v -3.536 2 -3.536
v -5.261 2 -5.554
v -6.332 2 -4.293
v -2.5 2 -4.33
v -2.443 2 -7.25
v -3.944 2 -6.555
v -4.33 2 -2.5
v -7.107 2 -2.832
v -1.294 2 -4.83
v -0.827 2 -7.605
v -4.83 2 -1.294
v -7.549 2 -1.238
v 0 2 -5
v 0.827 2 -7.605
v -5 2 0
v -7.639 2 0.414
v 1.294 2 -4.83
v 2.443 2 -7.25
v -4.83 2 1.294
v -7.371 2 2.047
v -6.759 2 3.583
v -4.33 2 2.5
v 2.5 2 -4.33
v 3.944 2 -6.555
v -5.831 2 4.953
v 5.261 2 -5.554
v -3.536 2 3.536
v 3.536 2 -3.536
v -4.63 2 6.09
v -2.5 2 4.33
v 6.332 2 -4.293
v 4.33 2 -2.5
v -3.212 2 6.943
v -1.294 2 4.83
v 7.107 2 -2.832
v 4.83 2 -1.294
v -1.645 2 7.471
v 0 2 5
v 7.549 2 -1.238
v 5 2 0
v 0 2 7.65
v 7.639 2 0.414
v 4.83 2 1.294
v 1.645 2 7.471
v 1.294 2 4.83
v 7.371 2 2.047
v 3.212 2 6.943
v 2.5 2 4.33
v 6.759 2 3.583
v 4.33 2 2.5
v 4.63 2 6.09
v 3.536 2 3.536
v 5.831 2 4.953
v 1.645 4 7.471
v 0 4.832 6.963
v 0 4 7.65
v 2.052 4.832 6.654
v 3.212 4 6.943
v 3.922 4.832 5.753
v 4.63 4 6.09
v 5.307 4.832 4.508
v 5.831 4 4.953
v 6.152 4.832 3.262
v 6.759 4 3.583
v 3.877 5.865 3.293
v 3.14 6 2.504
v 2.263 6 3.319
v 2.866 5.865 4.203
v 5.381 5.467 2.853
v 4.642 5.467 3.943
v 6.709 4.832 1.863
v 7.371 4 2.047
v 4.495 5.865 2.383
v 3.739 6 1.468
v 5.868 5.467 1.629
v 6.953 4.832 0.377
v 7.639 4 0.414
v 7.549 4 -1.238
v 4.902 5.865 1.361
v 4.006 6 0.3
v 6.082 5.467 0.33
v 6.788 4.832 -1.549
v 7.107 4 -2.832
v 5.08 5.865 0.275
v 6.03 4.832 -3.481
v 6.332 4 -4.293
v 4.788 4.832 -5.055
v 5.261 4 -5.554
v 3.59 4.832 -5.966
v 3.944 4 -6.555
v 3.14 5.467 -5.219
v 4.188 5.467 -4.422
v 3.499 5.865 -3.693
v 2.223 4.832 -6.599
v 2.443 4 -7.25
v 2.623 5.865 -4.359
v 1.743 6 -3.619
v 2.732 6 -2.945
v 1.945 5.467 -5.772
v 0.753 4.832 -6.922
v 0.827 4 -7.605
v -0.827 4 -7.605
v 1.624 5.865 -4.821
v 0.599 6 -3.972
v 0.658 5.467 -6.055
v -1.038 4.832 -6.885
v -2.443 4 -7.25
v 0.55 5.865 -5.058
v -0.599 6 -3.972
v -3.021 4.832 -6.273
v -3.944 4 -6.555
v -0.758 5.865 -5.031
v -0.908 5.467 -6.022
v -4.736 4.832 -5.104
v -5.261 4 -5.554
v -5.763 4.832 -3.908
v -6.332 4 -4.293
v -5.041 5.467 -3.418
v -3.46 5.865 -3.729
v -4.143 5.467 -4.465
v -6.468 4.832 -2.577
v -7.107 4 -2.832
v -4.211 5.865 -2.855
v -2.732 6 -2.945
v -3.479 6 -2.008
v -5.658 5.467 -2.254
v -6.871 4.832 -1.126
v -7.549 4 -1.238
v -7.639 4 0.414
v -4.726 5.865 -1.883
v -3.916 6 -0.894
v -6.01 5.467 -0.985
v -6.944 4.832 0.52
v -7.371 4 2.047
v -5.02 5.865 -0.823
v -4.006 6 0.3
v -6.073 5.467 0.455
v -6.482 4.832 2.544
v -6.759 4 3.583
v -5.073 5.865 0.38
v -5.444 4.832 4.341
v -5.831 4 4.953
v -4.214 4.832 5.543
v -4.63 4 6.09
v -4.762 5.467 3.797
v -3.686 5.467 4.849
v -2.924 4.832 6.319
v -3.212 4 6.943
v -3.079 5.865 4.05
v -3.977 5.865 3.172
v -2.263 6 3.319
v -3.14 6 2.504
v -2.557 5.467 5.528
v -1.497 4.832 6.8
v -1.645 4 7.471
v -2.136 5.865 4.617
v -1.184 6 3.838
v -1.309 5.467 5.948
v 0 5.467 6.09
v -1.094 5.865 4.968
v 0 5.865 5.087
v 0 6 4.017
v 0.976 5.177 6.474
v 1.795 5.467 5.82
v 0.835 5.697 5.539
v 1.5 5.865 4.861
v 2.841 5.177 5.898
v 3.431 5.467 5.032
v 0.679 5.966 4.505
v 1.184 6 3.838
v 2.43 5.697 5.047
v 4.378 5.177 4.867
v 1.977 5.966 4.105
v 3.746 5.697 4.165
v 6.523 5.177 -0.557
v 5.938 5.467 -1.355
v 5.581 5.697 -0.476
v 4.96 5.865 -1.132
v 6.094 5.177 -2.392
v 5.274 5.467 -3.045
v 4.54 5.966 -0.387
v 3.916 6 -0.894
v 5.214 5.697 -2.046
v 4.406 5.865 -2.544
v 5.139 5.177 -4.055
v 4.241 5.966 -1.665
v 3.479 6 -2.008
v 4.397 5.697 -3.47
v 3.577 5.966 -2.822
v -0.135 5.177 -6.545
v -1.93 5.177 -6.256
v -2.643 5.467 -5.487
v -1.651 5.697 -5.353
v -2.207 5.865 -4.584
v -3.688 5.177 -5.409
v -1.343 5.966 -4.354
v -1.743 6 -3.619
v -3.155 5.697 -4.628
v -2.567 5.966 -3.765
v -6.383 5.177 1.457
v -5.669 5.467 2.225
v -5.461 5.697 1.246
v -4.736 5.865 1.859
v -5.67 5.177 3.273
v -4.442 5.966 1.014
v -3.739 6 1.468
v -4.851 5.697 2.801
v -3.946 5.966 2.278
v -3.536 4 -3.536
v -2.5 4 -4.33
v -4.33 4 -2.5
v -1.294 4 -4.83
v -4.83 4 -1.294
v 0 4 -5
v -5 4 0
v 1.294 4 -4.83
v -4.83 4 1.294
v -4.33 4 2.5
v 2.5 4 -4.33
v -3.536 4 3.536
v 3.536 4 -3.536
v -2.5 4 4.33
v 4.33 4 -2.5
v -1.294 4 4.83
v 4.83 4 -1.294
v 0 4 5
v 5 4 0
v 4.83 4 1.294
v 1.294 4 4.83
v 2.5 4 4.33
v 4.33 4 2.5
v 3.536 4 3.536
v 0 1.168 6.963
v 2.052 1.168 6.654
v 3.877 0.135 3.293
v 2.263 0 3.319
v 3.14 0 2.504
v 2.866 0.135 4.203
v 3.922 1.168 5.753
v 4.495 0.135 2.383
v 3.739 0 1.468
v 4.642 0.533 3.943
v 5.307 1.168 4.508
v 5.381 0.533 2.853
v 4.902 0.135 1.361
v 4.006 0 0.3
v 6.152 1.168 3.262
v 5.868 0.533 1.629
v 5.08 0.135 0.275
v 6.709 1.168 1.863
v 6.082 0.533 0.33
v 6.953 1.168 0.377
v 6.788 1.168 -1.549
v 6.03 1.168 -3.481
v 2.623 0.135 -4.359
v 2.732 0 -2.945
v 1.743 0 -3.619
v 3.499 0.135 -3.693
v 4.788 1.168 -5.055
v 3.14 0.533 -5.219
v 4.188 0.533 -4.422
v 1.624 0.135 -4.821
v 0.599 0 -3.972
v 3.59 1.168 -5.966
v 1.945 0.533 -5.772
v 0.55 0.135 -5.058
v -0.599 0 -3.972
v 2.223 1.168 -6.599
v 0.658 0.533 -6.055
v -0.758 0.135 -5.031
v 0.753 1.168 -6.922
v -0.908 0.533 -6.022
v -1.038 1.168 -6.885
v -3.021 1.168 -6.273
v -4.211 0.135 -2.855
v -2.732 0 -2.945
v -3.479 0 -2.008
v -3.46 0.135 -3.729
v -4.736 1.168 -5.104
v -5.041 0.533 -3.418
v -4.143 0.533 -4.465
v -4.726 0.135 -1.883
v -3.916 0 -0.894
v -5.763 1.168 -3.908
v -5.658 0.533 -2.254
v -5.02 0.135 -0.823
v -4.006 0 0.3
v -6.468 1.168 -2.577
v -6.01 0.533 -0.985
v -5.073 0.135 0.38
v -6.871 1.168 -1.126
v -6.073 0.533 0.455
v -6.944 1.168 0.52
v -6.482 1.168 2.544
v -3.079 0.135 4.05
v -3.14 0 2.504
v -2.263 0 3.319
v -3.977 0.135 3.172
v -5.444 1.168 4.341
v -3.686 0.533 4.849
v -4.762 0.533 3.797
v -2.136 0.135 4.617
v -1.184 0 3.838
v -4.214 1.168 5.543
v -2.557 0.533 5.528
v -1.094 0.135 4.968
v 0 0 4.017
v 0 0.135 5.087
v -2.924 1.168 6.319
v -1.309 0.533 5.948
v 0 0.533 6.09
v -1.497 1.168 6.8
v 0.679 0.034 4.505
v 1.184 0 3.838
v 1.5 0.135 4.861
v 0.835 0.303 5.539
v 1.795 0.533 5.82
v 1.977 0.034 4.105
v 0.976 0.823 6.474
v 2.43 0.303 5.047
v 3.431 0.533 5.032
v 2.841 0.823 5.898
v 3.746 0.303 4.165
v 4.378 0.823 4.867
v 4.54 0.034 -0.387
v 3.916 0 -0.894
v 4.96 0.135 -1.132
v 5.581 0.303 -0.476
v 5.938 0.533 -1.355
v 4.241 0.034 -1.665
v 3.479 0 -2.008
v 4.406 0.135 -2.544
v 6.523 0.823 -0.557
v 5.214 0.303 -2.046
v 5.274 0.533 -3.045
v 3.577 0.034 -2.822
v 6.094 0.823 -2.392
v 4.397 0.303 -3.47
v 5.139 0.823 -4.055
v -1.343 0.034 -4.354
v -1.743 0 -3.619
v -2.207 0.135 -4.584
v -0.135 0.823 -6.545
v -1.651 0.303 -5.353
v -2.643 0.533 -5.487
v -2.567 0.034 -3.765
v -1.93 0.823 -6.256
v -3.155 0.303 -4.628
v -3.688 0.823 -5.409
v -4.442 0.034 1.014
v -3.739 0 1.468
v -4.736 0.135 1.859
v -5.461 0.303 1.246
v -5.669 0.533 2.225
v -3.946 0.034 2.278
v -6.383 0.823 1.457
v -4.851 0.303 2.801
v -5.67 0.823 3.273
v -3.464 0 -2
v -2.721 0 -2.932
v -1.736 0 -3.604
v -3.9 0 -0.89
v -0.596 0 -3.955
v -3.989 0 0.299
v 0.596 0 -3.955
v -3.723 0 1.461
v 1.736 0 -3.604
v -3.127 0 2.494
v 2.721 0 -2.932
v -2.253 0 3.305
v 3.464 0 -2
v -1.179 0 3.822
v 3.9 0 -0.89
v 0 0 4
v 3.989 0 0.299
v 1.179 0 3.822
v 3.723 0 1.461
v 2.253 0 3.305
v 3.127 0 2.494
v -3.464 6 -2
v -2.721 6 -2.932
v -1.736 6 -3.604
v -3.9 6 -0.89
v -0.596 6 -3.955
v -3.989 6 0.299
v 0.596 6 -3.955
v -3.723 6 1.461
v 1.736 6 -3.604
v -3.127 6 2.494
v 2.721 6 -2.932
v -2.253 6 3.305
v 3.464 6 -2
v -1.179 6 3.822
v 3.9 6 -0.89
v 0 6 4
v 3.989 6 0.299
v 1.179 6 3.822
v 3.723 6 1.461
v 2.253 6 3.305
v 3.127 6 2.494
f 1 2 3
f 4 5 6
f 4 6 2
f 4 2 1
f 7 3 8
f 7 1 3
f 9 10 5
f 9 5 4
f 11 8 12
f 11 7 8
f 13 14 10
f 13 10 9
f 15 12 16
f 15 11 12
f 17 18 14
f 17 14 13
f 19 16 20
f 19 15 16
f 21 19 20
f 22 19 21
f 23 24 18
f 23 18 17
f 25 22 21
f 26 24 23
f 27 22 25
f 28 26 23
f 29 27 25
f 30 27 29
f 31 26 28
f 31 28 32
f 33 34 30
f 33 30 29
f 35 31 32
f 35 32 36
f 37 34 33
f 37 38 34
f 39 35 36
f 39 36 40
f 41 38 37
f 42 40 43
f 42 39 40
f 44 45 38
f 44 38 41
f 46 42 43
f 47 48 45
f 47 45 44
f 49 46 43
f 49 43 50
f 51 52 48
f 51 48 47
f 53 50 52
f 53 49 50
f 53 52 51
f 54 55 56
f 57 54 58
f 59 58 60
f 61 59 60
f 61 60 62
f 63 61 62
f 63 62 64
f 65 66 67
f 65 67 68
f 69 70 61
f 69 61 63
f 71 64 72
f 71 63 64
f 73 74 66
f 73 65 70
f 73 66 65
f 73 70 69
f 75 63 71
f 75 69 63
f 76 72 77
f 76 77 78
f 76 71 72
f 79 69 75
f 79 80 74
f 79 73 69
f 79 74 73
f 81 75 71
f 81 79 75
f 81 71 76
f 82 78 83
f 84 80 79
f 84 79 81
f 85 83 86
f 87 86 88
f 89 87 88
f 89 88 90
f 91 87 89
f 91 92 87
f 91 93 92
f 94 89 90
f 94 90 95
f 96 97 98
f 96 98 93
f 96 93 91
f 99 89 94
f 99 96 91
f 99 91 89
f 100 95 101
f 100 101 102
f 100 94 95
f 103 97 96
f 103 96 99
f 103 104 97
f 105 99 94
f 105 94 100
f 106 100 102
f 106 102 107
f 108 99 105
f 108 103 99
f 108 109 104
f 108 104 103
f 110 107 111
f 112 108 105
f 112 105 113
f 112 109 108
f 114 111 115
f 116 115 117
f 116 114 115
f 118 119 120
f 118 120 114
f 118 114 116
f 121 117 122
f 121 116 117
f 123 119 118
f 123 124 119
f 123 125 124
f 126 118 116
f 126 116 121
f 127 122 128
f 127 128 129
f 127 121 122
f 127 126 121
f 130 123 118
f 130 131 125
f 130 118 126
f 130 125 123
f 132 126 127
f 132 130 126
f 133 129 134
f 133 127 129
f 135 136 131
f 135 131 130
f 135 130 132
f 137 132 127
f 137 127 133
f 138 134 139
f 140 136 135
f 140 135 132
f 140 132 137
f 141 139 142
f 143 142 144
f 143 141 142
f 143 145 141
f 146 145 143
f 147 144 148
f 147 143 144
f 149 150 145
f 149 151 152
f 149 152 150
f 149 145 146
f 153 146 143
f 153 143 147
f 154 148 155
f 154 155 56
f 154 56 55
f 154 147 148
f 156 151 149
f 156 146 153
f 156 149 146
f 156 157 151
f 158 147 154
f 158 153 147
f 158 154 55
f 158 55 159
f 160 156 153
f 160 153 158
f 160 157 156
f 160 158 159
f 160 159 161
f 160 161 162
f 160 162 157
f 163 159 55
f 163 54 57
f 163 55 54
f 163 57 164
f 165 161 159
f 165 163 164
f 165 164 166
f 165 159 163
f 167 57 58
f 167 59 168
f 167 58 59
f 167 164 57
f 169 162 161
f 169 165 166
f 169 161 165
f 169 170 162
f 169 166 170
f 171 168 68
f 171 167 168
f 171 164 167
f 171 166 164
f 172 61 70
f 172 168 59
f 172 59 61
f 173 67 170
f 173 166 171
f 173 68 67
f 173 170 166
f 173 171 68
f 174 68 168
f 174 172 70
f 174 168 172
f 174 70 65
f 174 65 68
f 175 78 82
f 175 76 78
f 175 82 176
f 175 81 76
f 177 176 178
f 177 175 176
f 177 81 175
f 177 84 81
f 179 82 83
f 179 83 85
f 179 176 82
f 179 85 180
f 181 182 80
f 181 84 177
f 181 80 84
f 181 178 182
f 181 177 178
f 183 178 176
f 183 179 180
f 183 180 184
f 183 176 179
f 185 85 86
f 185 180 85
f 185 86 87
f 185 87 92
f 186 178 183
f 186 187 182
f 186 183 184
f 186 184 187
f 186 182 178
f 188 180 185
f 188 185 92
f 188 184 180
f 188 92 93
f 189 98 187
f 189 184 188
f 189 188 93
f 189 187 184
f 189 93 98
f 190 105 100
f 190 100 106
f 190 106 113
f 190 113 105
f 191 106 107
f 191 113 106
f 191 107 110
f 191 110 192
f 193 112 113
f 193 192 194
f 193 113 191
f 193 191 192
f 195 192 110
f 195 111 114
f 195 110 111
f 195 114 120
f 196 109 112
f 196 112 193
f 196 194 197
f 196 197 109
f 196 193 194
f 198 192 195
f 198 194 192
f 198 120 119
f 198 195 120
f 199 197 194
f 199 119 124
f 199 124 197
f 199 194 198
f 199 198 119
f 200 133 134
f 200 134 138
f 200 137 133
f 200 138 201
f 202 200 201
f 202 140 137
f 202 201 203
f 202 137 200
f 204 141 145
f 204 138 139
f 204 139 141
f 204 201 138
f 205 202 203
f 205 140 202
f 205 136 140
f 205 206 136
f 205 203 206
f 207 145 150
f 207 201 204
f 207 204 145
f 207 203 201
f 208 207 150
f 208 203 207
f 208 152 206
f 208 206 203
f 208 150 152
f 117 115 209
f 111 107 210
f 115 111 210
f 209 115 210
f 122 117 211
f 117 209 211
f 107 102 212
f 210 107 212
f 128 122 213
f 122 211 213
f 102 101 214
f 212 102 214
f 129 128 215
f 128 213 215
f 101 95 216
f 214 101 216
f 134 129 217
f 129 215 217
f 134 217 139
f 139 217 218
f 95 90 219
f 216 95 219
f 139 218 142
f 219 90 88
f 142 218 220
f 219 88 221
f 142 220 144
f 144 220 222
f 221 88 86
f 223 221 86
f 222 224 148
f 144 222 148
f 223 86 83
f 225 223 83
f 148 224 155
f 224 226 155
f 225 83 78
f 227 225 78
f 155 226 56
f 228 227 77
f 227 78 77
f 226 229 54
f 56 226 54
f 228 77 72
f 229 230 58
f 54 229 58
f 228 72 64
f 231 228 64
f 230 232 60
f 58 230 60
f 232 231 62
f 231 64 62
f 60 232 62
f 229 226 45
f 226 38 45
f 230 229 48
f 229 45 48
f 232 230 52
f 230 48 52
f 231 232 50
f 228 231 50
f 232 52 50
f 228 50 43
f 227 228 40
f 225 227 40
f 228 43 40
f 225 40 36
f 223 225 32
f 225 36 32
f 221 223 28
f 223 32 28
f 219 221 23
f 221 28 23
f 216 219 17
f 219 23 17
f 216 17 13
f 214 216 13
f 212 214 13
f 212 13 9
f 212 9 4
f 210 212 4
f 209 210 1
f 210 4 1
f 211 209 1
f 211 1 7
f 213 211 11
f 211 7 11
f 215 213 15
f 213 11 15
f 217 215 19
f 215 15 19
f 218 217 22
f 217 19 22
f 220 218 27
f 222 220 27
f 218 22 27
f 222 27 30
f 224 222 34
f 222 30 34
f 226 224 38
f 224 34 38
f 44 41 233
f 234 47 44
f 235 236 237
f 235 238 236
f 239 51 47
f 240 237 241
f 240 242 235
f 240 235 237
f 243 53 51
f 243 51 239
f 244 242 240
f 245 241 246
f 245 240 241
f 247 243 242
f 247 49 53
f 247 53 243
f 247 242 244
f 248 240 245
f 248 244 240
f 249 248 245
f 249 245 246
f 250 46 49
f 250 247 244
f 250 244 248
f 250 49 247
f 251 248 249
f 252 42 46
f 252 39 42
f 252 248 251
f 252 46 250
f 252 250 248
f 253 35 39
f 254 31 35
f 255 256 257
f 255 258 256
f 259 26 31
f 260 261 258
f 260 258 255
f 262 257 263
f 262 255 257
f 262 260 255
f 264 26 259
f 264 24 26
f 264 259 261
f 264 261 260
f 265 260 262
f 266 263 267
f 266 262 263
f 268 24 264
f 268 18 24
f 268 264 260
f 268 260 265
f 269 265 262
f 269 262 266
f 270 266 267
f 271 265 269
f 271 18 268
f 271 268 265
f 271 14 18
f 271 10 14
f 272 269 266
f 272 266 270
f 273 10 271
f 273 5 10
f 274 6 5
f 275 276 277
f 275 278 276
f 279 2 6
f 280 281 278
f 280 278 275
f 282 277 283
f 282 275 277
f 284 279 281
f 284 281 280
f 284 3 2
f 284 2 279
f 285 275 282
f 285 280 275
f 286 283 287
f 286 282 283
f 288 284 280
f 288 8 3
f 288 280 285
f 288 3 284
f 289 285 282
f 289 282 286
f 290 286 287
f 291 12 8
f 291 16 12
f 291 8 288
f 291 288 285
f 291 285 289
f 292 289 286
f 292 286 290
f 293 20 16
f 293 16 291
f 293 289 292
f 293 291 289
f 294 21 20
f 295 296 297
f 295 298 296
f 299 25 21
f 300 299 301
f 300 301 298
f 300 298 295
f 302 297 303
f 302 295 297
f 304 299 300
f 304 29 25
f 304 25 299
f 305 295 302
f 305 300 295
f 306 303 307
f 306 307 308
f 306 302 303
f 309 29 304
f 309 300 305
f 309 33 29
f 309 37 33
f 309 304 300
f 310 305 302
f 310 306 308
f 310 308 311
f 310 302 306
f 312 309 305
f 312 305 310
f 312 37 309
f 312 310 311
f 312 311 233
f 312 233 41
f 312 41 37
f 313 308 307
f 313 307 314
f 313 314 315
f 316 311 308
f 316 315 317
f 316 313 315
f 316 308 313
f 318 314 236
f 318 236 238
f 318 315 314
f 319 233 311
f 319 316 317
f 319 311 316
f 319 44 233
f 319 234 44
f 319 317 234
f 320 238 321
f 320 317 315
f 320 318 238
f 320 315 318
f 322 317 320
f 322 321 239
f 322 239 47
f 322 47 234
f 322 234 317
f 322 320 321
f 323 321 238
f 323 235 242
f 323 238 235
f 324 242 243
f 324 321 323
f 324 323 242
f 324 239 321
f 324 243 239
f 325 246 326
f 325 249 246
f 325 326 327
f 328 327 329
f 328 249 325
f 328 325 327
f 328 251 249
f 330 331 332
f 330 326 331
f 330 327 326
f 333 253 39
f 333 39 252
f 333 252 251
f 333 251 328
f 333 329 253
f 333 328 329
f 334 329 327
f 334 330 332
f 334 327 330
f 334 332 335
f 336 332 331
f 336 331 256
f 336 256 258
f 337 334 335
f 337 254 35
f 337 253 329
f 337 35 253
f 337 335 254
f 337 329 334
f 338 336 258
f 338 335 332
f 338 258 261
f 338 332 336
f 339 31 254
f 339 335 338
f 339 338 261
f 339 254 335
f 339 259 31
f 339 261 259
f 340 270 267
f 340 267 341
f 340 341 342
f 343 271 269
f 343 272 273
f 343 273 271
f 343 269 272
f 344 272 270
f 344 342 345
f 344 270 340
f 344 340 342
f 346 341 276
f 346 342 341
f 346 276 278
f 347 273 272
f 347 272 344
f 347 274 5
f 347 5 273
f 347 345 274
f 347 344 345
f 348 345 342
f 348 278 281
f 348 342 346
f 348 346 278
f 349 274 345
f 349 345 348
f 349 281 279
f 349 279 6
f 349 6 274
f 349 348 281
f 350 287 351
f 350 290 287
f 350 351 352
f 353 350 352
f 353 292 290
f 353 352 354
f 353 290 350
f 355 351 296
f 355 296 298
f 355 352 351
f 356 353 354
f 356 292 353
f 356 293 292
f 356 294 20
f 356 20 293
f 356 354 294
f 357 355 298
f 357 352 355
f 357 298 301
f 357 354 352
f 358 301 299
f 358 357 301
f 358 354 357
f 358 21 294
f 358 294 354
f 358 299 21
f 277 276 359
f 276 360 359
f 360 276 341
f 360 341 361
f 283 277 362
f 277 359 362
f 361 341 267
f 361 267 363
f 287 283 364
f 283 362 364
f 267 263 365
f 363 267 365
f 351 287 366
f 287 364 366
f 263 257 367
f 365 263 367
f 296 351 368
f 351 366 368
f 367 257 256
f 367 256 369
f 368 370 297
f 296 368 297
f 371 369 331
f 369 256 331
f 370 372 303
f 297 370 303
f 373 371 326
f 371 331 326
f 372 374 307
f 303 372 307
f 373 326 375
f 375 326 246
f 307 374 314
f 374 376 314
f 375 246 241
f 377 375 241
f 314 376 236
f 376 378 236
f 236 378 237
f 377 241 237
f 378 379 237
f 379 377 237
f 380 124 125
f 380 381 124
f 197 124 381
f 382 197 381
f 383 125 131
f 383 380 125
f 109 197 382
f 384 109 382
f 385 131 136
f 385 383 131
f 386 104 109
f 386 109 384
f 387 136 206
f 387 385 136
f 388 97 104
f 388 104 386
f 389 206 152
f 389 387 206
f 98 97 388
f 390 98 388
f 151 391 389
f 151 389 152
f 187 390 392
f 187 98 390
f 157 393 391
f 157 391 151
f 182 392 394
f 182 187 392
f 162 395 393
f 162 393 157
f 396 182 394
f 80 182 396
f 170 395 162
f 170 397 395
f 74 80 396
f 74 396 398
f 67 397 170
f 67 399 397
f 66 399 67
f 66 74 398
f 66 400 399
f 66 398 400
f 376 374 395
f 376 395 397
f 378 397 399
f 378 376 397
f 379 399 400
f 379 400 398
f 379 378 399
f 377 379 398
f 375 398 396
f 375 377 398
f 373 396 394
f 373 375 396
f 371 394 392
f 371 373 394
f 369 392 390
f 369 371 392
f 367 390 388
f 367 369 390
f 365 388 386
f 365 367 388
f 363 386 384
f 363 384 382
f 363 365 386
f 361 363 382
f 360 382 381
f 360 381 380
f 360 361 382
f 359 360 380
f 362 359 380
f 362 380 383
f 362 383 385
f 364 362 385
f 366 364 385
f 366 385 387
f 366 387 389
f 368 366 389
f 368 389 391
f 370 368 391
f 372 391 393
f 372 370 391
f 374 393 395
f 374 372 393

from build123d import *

# Parameters (mm, degrees)
SKETCH1_R           = 7.65
SKETCH1_R_2         = 4
BOSS_EXTRUDE1_DEPTH = 6
SKETCH2_R           = 7.65
SKETCH2_R_2         = 5
CUT_EXTRUDE1_DEPTH  = 1
FILLET1_R           = 4.3


with BuildPart() as part:
    # Sketch1 → Boss-Extrude1 (new body)
    with BuildSketch(Plane(origin=(0, 0, 0), x_dir=(1, 0, 0), z_dir=(0, 1, 0))):
        with Locations(Location((0, 0, 0), (0, 0, 270))):
            Circle(SKETCH1_R)
        with Locations(Location((0, 0, 0), (0, 0, 270))):
            Circle(SKETCH1_R_2, mode=Mode.SUBTRACT)
    extrude(amount=BOSS_EXTRUDE1_DEPTH)

    # Sketch2 → Cut-Extrude1 (cut, symmetric)
    with BuildSketch(Plane(origin=(0, 3, 0), x_dir=(1, 0, 0), z_dir=(0, 1, 0))):
        with Locations(Location((0, 0, 0), (0, 0, 270))):
            Circle(SKETCH2_R)
        with Locations(Location((0, 0, 0), (0, 0, 270))):
            Circle(SKETCH2_R_2, mode=Mode.SUBTRACT)
    extrude(amount=CUT_EXTRUDE1_DEPTH, both=True, mode=Mode.SUBTRACT)

    # Fillet1
    # the kernel refuses this fillet: 4.3 mm, written as the material it takes off along each edge
    with BuildSketch(Plane(origin=(0, 0, 0), x_dir=(0, 0, 1), z_dir=(-1, 0, 0))) as fillet1_piece_1:
        with BuildLine():
            CenterArc((4.016819575, 4.3), FILLET1_R, 270, 57.663974002)
            Line((4.016819575, 0), (7.65, 0))
            Line((7.65, 0), (7.65, 2))
        make_face()
    revolve(axis=Axis((0, 0, 0), (0, 1, 0)), mode=Mode.SUBTRACT)
    with BuildSketch(Plane(origin=(0, 6, 0), x_dir=(0, 0, 1), z_dir=(-1, 0, 0))) as fillet1_piece_2:
        with BuildLine():
            CenterArc((4.016819575, -4.3), FILLET1_R, 32.336025998, 57.663974002)
            Line((7.65, -2), (7.65, 0))
            Line((7.65, 0), (4.016819575, 0))
        make_face()
    revolve(axis=Axis((0, 6, 0), (0, 1, 0)), mode=Mode.SUBTRACT)


solid = part.part
